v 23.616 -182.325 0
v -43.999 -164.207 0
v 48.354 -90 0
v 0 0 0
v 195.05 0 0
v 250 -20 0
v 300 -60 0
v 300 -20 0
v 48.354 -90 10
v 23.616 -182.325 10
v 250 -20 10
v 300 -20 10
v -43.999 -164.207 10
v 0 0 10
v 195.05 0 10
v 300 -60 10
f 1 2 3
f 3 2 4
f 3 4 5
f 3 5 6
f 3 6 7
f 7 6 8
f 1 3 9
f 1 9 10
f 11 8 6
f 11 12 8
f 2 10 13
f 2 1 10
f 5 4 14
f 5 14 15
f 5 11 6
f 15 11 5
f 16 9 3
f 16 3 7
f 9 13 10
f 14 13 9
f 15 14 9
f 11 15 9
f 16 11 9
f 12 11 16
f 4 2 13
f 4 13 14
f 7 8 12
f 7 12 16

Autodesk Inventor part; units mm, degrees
ref_plane "YZ Plane" through (0, 0, 0) normal (1, 0, 0) x (0, 1, 0)
ref_plane "XZ Plane" through (0, 0, 0) normal (0, 1, 0) x (-1, 0, 0)
ref_plane "XY Plane" through (0, 0, 0) normal (0, 0, 1) x (1, 0, 0)
sketch "Sketch1" plane through (0, 0, 0) normal (0, 0, 1) x (1, 0, 0)
  line L0 (300, 0) -> (300, -90)
  line L1 (300, -90) -> (0, -90)
  line L2 (67.6148, -18.1173) -> (23.6156, -182.3247)
  line L3 (23.6156, -182.3247) -> (-43.9992, -164.2074)
  line L4 (-43.9992, -164.2074) -> (0, 0)
  line L5 (0, 0) -> (67.6148, -18.1173)
  line L6 (0, 0) -> (300, 0)
  line L7 (0, -90) -> (0, 0)
  dimension "d0" = 300
  dimension "d1" = 90
  dimension "d2" = 70
  dimension "d3" = 170
  dimension "d5" = 105
  dimension "d6" = 0
  dimension "d7" = 0
  dimension "d8" = 0
  dimension "d9" = 300
extrude "Extrusion1" add sketch "Sketch1" along normal blind 10
sketch "Sketch2" plane through (0, 0, 10) normal (0, 0, 1) x (1, 0, 0)
  line L0 (300, -90) -> (300, 0) projected
  line L1 (300, -20) -> (300, -60)
  line L2 (23.6156, -182.3247) -> (48.3539, -90) projected
  line L3 (48.3539, -90) -> (300, -60)
  line L4 (300, -20) -> (250, -20)
  line L5 (250, -20) -> (118.443, 27.8828)
  line L6 (48.3539, -90) -> (300, -90) projected
  line L7 (48.3539, -90) -> (300, -90)
  line L8 (300, -90) -> (300, -60)
  line L9 (300, 0) -> (0, 0) projected
  line L10 (195.0505, 0) -> (300, 0)
  line L11 (300, 0) -> (300, -20)
  dimension "d12" = 40
  dimension "d13" = 20
  dimension "d14" = 50
  dimension "d15" = 140
  dimension "d16" = 160
extrude "Extrusion2" cut sketch "Sketch2" against normal blind 10
properties part number "Pivot Link"
